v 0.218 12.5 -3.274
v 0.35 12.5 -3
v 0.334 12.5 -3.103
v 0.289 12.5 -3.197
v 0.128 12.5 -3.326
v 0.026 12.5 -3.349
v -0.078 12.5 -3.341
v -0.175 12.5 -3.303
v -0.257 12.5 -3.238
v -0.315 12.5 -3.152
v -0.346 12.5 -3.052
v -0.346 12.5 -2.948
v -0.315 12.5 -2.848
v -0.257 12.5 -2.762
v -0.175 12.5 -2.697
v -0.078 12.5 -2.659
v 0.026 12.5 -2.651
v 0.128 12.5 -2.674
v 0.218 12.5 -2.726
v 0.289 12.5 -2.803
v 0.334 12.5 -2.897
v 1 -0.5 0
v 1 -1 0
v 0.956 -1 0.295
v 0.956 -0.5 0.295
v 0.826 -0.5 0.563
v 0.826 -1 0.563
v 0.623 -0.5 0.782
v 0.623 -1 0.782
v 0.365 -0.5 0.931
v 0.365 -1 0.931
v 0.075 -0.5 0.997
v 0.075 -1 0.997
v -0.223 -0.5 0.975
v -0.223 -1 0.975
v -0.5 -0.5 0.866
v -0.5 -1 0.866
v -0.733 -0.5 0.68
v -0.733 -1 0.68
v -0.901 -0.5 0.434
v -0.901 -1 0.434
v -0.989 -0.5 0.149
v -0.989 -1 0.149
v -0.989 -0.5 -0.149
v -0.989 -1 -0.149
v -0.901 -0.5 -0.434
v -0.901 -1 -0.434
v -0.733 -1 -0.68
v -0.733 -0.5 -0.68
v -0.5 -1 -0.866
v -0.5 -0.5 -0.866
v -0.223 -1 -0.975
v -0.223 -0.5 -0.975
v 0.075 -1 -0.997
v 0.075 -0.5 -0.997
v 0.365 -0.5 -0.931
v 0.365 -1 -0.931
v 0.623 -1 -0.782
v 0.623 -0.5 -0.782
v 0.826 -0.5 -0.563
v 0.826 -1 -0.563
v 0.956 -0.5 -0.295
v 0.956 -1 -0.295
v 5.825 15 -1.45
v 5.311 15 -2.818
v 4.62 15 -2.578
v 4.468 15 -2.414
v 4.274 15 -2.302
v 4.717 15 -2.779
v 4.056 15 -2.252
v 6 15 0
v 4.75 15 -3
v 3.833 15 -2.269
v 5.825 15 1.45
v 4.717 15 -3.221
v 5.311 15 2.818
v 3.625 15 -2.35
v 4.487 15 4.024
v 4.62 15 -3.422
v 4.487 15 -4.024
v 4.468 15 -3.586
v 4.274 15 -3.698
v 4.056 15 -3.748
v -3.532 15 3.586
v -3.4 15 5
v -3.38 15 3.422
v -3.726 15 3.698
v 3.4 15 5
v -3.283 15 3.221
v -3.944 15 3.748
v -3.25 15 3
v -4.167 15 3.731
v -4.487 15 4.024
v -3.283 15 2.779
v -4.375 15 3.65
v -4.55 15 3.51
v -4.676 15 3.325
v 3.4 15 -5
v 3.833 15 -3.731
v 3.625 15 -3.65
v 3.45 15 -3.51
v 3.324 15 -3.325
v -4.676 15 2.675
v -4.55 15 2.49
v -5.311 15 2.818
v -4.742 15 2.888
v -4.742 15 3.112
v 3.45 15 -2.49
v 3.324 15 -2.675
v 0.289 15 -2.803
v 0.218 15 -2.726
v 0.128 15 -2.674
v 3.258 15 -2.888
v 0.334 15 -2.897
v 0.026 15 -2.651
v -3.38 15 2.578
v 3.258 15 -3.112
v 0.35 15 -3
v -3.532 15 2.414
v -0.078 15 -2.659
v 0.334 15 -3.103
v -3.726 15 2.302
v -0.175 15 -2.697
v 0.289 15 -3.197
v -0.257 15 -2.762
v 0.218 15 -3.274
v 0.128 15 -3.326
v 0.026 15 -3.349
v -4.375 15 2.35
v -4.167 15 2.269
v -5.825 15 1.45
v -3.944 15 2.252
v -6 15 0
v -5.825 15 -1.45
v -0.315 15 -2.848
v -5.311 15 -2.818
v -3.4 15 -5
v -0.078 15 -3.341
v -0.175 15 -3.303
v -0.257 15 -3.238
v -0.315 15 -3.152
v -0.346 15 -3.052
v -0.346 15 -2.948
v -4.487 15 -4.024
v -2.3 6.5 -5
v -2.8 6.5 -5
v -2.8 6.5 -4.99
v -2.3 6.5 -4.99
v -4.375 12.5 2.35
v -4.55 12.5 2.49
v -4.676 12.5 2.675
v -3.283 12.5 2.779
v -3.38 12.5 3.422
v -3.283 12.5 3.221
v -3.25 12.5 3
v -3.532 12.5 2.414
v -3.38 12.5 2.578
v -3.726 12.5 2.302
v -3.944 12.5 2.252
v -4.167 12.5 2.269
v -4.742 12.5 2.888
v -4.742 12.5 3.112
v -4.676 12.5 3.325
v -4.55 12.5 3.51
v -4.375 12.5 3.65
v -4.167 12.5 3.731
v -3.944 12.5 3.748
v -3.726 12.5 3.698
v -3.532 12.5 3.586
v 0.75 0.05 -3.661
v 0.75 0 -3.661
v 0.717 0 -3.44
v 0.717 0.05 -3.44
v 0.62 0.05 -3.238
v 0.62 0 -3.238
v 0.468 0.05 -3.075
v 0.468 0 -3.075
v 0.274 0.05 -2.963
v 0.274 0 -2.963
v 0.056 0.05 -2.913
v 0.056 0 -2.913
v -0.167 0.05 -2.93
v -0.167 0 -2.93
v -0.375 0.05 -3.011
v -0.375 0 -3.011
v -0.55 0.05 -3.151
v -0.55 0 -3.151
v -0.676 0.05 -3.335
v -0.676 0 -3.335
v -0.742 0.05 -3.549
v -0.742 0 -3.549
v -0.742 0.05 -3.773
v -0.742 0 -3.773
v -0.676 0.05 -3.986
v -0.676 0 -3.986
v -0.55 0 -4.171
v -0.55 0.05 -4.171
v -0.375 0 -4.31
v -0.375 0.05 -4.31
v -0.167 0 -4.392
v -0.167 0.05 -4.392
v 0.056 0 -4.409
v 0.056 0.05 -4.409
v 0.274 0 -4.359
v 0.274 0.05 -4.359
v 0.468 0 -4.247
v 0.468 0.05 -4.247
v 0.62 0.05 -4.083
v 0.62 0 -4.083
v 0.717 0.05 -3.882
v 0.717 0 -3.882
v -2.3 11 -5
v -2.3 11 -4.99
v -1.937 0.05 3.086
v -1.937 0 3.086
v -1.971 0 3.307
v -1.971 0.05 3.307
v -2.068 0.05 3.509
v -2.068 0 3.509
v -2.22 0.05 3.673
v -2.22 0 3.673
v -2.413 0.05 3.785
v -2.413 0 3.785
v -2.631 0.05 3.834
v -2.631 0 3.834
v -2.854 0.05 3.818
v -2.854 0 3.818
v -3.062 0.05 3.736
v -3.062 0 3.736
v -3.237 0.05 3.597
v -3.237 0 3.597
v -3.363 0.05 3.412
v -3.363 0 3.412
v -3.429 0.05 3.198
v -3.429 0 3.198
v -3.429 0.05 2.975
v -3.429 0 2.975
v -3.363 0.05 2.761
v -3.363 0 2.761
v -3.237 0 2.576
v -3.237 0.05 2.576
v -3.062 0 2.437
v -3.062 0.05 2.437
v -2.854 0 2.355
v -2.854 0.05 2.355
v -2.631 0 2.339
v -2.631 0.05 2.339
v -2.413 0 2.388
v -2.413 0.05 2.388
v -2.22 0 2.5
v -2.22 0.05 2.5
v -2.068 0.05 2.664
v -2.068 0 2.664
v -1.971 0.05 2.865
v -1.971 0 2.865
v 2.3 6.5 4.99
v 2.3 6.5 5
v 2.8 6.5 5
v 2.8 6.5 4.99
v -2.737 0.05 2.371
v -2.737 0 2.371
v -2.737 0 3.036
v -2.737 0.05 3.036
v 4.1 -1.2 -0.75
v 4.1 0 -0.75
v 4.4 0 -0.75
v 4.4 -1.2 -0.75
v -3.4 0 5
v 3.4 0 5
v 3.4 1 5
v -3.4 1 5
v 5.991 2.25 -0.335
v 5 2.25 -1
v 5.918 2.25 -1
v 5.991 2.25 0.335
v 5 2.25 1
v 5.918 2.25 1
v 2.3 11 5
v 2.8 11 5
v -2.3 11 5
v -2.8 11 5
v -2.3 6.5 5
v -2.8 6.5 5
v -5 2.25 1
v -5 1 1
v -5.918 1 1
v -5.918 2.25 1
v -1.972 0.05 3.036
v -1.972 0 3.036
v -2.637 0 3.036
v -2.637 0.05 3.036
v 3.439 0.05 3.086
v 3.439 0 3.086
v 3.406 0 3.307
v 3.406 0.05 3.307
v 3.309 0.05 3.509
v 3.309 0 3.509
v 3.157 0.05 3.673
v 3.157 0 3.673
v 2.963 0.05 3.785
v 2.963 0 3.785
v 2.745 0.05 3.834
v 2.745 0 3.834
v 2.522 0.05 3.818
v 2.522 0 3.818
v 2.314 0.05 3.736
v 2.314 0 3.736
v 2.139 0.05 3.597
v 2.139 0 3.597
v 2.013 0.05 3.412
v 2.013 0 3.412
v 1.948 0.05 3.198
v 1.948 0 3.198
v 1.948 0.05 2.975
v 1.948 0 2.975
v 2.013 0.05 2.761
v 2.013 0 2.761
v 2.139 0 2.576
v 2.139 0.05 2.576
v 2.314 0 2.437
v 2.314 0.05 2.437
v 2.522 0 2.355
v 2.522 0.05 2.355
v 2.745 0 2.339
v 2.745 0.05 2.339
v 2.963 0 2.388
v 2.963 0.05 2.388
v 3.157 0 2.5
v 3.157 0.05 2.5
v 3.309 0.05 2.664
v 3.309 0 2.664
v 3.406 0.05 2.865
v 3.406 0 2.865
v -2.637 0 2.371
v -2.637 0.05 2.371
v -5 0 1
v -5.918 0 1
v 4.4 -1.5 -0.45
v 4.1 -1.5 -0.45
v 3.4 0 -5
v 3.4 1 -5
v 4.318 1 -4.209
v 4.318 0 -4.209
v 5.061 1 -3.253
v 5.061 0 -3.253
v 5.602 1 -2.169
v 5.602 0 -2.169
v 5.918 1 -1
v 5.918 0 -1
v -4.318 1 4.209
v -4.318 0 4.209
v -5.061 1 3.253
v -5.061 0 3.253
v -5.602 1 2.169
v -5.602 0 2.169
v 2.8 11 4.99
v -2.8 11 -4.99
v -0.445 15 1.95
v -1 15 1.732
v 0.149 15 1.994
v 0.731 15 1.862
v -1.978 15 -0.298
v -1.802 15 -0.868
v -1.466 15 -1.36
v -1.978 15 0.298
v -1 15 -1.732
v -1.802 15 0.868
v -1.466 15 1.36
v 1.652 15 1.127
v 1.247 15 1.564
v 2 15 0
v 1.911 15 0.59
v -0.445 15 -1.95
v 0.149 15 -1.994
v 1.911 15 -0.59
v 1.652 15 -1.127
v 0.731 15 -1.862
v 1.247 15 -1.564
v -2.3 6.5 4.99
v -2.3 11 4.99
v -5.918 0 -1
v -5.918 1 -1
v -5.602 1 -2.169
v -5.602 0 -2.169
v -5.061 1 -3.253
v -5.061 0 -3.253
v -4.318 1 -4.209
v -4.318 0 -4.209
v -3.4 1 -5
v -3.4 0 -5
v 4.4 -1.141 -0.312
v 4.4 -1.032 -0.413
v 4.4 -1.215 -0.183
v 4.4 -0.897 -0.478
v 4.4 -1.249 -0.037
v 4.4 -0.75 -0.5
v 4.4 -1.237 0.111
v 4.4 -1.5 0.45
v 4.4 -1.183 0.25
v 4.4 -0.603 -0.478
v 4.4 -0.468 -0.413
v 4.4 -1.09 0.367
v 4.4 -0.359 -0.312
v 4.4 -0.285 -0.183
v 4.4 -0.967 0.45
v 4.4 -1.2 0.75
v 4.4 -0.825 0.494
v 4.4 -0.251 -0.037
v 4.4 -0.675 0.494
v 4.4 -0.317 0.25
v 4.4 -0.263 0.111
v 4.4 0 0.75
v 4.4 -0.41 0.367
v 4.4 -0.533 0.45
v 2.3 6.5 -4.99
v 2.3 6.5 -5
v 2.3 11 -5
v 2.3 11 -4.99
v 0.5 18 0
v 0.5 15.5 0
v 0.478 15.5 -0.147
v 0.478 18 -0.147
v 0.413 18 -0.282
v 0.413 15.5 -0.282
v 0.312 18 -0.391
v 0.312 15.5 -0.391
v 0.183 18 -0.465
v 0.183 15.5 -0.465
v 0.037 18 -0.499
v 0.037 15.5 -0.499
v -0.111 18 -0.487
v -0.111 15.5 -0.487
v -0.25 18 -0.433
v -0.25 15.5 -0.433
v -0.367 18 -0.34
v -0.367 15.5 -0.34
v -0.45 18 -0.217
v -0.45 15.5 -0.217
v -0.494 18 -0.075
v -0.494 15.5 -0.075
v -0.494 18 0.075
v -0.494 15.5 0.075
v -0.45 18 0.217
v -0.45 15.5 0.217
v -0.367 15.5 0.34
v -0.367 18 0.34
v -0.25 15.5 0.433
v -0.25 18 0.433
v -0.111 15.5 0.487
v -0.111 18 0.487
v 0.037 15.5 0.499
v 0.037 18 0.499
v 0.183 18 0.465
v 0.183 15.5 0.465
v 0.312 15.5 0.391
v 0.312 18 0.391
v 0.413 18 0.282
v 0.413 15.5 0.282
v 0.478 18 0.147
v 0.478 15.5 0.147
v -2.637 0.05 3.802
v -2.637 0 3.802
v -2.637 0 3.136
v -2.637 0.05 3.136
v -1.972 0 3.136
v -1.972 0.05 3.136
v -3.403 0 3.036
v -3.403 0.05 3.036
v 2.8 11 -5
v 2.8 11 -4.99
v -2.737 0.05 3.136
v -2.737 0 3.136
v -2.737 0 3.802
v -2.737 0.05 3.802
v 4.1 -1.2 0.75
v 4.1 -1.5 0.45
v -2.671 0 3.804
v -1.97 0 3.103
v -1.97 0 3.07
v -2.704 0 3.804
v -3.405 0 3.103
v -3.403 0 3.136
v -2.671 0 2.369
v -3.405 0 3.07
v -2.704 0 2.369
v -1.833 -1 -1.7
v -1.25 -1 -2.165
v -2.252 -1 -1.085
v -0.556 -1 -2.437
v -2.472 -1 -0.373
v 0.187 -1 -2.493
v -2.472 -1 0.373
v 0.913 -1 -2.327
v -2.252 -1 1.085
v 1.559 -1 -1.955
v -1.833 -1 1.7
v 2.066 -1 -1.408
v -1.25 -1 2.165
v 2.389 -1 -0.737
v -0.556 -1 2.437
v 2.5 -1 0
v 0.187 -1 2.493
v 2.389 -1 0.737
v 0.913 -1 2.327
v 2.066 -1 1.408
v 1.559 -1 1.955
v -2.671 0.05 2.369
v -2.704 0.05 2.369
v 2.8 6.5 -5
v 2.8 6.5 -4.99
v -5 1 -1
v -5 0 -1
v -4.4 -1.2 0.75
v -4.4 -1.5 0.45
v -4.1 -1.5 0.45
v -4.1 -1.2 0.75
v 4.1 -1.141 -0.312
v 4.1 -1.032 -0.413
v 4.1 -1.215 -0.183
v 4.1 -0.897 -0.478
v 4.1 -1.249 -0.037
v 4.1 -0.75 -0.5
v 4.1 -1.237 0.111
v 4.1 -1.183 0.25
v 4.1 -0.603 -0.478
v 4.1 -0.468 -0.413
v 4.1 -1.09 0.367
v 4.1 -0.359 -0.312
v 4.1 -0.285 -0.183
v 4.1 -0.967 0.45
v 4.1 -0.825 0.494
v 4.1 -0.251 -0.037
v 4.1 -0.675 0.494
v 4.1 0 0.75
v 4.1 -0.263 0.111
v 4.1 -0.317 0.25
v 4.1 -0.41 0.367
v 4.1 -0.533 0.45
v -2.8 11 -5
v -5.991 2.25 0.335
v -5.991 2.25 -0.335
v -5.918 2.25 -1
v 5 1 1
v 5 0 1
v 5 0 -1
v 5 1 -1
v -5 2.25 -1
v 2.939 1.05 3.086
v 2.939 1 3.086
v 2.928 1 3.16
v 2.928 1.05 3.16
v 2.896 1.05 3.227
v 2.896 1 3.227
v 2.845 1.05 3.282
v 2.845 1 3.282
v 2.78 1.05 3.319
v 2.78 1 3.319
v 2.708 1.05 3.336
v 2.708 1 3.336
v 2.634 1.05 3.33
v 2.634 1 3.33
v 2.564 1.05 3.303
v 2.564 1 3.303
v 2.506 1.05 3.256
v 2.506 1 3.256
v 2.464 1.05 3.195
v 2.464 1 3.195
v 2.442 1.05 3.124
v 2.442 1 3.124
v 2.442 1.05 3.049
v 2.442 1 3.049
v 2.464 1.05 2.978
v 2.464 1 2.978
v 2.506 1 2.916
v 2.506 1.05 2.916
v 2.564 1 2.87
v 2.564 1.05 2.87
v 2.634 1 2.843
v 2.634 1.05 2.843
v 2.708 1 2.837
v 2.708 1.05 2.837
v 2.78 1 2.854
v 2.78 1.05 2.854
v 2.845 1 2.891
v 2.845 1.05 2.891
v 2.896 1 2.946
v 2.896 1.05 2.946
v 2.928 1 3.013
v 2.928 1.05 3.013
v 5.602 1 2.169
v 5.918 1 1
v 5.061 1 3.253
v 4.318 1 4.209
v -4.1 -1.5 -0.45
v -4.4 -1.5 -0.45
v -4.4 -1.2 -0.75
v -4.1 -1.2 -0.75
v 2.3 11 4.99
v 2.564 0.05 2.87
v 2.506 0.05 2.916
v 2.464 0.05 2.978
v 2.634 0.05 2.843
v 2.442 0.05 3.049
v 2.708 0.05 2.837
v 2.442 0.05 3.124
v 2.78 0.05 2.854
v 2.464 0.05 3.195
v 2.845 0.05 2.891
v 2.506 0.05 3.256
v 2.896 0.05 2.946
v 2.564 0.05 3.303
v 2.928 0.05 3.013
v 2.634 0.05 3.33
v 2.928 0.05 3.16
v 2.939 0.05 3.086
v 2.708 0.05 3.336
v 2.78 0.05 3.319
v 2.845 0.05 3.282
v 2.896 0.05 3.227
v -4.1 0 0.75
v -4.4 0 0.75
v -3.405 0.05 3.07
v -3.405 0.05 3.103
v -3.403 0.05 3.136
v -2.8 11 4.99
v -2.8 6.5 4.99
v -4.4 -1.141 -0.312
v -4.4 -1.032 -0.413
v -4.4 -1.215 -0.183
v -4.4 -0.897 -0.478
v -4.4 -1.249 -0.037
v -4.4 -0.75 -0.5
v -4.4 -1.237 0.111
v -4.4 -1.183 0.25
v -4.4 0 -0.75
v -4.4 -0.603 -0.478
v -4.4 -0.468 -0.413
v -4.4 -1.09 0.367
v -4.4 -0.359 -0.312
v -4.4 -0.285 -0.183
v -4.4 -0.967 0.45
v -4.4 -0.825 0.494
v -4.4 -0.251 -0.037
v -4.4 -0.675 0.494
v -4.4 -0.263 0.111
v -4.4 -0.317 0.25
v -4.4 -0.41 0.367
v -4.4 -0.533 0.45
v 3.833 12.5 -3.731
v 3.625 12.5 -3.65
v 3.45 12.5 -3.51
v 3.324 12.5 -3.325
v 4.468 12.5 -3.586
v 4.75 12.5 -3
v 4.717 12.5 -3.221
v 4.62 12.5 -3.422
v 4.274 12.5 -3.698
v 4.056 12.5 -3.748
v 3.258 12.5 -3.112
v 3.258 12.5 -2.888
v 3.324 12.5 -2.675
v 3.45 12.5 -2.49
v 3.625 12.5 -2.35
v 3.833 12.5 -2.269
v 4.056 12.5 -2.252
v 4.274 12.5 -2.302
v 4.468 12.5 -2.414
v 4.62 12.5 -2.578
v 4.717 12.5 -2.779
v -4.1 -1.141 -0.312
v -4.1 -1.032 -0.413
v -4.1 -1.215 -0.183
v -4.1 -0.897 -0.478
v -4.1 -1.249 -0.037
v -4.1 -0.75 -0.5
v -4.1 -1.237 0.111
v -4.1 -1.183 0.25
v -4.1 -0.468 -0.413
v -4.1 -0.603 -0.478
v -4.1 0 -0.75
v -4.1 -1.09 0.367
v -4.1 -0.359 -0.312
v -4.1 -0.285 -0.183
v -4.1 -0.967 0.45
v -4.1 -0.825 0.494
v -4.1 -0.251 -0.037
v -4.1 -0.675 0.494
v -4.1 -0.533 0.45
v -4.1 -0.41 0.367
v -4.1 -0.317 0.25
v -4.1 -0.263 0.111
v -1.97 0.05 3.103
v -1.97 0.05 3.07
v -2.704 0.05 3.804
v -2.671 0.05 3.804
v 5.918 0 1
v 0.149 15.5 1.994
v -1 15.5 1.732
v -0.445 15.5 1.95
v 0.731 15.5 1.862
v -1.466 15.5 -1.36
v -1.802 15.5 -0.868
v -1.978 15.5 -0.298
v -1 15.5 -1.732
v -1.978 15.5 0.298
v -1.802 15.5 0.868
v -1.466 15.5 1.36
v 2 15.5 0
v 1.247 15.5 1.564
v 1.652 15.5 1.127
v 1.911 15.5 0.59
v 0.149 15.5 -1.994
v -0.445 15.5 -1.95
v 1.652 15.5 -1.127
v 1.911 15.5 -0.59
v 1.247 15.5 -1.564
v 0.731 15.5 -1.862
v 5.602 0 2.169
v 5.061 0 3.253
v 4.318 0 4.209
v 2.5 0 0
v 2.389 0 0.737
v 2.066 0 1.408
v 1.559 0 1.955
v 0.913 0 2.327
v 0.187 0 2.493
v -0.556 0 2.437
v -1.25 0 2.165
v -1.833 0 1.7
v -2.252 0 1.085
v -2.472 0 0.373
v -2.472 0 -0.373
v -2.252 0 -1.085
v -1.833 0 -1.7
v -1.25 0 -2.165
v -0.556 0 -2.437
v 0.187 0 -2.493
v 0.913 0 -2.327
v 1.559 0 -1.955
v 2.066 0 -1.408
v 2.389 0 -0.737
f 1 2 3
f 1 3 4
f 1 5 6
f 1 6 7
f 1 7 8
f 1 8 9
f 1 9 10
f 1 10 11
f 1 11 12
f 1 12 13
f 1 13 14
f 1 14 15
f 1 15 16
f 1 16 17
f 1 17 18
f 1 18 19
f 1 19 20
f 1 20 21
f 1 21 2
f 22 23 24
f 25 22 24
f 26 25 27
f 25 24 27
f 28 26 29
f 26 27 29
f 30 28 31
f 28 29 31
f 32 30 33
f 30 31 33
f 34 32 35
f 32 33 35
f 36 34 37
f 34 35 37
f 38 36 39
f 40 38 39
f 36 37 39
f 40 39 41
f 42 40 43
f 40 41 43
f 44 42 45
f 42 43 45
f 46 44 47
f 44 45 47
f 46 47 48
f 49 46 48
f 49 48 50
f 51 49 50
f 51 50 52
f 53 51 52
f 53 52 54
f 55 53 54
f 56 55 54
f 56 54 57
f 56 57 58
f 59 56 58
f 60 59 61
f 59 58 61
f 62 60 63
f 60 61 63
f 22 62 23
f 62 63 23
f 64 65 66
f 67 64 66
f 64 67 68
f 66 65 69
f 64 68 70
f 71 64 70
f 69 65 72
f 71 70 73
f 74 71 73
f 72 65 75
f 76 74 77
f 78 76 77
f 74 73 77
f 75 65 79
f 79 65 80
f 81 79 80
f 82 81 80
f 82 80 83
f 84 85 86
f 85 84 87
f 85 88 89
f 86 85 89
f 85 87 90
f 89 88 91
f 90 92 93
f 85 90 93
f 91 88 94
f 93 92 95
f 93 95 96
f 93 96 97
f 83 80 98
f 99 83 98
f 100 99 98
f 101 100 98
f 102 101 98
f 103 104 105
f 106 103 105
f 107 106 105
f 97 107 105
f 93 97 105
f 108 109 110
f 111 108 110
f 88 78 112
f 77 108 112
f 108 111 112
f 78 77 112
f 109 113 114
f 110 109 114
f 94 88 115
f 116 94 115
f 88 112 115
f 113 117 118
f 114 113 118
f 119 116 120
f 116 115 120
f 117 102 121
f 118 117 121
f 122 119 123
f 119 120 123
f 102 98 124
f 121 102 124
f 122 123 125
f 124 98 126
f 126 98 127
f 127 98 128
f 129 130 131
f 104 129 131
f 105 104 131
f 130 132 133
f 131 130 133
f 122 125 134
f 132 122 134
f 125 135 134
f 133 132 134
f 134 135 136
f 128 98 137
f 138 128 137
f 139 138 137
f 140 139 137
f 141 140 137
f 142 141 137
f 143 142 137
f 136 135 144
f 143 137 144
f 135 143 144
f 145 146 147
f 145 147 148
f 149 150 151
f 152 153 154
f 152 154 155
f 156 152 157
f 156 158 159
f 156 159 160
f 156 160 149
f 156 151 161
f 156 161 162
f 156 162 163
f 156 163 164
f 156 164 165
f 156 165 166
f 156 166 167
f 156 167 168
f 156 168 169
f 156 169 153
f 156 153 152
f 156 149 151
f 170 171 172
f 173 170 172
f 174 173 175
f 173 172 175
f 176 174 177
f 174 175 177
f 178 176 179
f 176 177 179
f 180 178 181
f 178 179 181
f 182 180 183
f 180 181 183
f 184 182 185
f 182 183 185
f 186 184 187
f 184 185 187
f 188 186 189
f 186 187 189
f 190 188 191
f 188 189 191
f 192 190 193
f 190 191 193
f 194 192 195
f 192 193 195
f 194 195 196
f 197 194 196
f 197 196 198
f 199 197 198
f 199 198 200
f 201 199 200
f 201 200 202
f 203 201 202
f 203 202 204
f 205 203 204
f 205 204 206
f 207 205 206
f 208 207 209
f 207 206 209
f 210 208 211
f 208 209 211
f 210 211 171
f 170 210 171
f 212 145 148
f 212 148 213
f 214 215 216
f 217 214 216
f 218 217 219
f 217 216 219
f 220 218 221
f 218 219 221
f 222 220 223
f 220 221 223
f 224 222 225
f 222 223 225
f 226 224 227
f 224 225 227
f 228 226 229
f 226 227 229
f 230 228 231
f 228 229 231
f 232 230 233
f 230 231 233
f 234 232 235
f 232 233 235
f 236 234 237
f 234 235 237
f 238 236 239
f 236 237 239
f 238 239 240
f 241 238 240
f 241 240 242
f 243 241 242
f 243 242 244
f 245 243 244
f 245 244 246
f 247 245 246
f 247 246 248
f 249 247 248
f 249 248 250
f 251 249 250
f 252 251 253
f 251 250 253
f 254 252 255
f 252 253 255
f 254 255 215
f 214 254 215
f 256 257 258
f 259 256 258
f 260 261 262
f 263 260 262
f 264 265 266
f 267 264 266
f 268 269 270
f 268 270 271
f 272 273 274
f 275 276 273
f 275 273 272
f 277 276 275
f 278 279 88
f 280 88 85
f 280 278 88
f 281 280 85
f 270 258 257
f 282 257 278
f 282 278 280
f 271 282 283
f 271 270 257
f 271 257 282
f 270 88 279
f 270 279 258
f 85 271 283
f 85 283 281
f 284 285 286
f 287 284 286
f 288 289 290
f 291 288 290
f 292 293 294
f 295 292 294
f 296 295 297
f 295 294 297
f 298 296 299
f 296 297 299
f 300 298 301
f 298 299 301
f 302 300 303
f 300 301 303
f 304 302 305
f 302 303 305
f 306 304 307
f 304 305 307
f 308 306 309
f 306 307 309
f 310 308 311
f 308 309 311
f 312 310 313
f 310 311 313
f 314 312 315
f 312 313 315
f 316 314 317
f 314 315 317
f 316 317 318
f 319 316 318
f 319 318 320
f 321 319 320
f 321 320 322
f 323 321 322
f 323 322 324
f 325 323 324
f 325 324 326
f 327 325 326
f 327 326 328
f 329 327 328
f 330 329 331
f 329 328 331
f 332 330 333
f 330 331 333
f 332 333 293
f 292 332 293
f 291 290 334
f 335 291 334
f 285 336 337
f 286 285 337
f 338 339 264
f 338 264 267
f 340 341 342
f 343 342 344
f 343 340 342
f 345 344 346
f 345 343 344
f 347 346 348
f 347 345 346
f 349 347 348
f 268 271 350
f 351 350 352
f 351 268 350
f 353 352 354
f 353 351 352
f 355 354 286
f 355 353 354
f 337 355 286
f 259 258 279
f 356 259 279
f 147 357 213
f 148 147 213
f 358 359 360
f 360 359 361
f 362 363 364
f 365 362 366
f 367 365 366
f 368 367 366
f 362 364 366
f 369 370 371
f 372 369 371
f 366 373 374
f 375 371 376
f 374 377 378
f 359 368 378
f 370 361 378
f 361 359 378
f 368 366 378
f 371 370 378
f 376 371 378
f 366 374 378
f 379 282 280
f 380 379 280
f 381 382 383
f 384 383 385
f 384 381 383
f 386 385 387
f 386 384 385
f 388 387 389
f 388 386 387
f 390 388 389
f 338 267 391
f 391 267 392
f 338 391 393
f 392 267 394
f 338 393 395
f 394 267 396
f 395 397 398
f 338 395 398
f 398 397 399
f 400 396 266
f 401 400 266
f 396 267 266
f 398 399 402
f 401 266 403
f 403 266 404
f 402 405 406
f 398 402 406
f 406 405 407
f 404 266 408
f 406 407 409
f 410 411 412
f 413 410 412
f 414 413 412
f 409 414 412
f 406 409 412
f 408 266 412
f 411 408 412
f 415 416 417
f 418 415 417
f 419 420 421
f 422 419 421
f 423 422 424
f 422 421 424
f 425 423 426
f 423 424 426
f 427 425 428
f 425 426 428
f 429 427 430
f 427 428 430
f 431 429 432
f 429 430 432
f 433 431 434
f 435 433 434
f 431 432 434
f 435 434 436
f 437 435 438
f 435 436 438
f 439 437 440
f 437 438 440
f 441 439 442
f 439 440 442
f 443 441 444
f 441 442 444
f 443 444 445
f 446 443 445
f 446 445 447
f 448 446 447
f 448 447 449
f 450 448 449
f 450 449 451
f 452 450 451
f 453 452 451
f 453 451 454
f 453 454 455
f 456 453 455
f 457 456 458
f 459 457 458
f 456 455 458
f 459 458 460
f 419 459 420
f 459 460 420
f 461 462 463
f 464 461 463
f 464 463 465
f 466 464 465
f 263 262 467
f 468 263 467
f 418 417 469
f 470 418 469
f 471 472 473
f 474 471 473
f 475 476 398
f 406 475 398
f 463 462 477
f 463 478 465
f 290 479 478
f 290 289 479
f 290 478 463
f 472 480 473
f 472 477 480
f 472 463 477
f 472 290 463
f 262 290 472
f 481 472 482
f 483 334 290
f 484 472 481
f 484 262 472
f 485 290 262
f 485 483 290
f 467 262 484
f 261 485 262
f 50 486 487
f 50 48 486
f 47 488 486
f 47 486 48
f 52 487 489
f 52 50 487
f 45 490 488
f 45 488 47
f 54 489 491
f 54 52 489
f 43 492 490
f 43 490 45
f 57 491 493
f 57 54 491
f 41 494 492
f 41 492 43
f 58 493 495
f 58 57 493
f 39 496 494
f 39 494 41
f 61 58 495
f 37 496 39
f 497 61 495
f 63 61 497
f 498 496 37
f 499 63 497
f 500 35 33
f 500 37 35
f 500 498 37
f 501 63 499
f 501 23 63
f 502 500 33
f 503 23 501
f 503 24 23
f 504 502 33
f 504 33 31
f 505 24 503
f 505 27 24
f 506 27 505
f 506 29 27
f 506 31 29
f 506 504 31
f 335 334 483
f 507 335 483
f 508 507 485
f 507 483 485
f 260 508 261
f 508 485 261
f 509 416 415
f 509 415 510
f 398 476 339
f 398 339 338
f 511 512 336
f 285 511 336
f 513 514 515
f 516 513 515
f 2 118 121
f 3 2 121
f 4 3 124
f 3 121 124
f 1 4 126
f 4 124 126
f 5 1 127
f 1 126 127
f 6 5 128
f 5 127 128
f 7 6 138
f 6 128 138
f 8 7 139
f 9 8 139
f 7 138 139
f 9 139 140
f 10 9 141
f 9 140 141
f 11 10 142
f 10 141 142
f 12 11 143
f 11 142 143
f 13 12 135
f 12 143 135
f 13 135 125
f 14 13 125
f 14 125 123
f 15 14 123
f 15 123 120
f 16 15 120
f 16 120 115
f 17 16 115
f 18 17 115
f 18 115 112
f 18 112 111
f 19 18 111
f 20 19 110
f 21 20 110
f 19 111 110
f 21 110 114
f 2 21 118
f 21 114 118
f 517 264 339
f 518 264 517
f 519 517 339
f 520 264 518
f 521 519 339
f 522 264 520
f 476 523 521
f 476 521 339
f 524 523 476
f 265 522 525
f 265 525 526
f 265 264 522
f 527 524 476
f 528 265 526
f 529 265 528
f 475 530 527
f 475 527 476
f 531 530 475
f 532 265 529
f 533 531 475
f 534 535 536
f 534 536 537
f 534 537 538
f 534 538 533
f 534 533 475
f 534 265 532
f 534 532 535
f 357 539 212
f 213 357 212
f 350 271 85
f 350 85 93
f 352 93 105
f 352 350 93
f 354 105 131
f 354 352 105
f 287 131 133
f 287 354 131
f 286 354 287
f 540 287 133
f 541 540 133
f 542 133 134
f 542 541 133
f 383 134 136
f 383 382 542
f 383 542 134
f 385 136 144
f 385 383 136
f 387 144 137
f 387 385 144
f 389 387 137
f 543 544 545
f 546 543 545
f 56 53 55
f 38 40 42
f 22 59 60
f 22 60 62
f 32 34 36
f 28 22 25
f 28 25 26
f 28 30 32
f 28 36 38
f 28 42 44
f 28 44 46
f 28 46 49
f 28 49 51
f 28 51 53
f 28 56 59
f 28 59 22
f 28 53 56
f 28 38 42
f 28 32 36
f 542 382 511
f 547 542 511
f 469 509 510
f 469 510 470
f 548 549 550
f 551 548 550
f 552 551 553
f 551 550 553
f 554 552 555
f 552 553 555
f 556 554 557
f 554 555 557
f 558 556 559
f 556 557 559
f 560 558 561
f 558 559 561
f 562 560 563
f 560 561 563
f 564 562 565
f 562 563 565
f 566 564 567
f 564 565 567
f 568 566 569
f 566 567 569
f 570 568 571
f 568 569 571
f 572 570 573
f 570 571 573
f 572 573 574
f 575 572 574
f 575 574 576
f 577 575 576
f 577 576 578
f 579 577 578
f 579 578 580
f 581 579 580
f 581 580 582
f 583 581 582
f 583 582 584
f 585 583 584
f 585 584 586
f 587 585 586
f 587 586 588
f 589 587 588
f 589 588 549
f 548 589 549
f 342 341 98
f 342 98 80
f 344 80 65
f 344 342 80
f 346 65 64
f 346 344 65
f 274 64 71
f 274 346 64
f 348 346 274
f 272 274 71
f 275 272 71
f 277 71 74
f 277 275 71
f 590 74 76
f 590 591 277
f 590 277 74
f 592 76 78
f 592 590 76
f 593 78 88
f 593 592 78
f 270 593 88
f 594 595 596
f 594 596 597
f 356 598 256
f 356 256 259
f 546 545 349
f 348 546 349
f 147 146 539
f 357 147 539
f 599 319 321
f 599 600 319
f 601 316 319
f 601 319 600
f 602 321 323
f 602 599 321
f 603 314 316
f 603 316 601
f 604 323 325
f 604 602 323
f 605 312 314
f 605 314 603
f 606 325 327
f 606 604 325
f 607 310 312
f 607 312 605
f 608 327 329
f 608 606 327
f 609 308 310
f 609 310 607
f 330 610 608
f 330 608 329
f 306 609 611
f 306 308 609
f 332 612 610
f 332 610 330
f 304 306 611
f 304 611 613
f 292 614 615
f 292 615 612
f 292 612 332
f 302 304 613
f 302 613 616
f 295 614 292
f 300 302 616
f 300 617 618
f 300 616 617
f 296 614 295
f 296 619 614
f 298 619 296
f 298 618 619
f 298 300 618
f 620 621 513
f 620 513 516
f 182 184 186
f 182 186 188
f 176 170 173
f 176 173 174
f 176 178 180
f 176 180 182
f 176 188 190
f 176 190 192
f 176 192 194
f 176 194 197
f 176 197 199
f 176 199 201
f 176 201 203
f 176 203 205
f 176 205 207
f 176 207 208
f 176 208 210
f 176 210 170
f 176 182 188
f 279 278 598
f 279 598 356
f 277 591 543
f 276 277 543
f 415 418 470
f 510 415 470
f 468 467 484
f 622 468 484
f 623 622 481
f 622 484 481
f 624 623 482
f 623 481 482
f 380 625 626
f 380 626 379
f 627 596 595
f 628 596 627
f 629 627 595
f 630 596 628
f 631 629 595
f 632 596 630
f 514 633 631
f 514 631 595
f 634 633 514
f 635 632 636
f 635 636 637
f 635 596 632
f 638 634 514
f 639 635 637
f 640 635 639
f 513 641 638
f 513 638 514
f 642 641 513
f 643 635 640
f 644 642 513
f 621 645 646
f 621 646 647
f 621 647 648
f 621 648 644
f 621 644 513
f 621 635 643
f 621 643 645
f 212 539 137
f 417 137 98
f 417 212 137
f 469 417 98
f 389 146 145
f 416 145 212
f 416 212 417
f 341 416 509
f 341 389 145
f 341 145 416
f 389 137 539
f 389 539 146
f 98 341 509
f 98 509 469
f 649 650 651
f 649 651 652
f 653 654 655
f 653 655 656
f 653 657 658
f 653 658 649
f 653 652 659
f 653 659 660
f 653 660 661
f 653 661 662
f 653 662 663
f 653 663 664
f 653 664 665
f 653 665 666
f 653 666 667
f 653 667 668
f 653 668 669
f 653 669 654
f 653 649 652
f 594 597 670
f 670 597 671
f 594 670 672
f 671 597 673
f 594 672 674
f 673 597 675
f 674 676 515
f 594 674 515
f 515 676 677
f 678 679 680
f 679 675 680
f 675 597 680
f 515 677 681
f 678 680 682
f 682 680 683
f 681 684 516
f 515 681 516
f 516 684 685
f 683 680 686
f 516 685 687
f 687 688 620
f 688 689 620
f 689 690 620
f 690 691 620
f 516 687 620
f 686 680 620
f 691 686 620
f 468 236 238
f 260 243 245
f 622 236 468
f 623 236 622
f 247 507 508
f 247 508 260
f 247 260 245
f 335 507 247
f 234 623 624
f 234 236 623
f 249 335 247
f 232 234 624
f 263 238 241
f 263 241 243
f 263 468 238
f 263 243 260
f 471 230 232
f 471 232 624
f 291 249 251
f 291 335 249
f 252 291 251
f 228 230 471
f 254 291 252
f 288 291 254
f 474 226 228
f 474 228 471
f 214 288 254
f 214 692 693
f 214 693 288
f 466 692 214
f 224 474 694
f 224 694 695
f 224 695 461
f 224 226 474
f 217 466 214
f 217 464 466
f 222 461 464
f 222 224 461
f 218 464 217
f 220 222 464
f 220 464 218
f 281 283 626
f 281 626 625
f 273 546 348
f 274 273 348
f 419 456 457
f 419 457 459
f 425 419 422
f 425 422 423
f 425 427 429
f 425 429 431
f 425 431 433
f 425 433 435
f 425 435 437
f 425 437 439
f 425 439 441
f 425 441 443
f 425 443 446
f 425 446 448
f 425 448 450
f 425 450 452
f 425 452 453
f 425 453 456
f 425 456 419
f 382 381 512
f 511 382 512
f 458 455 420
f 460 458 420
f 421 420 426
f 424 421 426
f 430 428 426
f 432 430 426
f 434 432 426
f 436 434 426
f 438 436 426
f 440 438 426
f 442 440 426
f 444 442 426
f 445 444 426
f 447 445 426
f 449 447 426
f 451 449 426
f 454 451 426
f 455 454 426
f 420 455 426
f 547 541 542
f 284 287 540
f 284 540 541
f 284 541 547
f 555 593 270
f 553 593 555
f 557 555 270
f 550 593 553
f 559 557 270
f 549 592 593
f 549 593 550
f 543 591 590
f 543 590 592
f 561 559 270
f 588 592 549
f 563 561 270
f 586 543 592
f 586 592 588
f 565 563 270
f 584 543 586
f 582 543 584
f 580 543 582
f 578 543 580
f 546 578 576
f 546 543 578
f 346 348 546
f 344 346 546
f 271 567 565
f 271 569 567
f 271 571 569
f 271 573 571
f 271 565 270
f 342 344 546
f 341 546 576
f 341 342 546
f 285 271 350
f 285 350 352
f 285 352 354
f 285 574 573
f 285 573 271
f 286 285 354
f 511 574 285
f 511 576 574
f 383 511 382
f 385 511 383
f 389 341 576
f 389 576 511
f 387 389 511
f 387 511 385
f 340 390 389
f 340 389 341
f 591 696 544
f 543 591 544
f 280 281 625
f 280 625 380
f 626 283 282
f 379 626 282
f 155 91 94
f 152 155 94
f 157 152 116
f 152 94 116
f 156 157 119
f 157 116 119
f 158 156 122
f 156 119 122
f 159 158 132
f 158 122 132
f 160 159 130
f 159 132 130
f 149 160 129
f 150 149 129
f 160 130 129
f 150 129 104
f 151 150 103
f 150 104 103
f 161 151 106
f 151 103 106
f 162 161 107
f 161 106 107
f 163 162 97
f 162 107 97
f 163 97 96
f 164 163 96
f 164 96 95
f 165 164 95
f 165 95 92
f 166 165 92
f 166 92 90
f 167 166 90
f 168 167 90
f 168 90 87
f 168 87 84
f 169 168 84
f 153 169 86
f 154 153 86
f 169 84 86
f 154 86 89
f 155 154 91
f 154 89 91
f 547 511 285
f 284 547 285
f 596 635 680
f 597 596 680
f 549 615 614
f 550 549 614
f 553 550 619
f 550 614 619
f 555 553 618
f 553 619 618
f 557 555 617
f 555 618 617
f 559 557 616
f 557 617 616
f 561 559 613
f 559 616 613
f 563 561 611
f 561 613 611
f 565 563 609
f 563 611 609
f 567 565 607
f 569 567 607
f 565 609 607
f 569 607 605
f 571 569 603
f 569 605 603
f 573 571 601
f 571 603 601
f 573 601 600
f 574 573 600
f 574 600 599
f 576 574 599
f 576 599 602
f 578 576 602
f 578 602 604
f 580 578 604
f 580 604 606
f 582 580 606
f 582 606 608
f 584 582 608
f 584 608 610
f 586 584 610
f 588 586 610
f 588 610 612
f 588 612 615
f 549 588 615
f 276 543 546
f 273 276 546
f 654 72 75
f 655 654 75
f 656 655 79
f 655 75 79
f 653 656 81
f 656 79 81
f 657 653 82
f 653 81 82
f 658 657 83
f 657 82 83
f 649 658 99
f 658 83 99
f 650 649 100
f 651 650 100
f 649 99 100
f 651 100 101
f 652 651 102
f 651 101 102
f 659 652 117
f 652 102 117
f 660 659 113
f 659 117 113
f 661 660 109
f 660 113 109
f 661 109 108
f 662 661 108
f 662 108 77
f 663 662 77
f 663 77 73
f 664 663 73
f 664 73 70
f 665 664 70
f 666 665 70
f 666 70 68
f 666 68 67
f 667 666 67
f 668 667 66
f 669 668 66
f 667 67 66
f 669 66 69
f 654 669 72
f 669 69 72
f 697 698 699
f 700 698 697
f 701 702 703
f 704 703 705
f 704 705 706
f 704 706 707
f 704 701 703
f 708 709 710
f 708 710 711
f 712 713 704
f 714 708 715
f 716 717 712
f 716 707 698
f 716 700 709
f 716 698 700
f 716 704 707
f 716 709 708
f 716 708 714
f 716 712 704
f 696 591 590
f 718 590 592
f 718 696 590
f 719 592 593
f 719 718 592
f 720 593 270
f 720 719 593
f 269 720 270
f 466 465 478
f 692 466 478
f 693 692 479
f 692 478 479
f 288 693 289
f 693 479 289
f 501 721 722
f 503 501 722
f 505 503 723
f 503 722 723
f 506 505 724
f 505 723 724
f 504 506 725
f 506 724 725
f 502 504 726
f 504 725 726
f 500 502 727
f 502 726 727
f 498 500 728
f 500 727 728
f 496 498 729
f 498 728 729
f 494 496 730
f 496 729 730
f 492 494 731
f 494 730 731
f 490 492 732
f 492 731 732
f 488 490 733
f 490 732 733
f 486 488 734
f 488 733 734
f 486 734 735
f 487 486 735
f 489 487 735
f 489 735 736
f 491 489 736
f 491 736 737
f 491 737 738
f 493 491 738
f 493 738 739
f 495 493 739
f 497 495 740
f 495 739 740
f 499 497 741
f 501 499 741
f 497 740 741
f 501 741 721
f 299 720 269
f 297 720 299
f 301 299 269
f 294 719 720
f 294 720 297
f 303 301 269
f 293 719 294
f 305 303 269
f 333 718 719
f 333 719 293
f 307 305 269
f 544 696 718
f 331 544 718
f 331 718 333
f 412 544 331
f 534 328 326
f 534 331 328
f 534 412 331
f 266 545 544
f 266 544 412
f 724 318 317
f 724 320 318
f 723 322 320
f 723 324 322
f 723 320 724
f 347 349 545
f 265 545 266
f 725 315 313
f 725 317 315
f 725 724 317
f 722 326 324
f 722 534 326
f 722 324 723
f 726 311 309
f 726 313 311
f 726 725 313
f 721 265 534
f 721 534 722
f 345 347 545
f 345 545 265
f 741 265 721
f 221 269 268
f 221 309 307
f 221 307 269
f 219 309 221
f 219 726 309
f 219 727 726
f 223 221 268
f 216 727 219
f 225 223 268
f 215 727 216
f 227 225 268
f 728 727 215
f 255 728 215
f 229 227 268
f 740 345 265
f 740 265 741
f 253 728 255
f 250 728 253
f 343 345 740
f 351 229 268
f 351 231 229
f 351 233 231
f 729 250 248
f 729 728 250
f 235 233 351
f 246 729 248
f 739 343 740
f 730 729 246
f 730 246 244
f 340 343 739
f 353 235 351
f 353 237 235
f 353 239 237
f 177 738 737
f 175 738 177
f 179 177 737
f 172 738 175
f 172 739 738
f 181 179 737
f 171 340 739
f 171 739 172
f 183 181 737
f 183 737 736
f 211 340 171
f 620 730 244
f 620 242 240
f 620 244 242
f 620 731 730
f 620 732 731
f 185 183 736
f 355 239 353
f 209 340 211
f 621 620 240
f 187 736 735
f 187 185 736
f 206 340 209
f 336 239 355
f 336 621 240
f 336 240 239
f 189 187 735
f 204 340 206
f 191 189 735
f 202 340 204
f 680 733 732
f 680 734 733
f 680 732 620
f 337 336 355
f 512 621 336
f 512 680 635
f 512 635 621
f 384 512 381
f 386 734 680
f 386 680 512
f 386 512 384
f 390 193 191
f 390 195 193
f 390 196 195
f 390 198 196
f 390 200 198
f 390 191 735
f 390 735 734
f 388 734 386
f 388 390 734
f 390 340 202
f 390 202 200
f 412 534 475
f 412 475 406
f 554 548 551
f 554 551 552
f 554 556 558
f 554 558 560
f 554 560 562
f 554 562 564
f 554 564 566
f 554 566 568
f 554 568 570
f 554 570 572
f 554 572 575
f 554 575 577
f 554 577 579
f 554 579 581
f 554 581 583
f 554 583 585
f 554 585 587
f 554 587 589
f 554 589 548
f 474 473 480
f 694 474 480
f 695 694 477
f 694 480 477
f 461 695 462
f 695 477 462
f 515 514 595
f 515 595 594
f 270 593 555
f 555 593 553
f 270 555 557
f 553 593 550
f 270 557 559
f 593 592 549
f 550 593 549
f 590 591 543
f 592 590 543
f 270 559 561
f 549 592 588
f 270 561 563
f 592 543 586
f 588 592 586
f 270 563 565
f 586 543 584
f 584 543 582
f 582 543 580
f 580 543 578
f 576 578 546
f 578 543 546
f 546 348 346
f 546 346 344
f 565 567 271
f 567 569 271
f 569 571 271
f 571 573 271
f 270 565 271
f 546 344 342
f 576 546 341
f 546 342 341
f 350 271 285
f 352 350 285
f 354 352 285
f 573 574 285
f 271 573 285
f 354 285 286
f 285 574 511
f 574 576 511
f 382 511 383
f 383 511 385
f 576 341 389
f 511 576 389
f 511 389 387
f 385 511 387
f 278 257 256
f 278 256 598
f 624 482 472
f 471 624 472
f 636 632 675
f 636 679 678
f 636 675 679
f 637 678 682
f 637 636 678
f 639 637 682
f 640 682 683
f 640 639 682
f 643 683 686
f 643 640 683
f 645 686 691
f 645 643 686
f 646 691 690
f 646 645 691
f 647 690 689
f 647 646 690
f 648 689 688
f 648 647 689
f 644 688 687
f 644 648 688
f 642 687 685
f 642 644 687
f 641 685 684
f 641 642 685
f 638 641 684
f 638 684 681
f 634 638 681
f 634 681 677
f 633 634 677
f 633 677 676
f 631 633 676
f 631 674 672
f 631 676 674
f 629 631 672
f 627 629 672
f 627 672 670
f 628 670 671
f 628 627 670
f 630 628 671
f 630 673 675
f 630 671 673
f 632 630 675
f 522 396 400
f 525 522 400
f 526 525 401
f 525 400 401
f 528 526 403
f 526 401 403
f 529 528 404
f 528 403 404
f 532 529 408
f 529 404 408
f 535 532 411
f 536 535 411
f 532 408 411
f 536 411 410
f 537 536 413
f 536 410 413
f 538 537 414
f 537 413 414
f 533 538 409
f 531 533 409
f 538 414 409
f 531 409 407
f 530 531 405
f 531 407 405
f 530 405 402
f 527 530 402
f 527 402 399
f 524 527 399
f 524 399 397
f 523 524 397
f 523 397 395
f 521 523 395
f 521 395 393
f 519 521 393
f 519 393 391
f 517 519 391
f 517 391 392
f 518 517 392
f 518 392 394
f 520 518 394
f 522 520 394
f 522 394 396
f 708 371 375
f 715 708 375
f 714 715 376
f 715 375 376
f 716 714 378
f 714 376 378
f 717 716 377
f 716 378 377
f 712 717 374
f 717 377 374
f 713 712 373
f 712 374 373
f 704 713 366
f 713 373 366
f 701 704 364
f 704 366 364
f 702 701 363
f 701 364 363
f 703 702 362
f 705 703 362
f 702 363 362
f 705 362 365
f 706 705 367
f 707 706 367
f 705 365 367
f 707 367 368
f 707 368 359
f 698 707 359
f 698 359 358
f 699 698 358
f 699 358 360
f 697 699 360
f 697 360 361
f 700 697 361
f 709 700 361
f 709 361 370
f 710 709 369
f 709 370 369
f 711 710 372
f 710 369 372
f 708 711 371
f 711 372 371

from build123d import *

# Parameters (mm, degrees)
SALIENTE_EXTRUIR1_DEPTH = 1
SALIENTE_EXTRUIR2_DEPTH = 14
CROQUIS3_W              = 0.5
CROQUIS3_H              = 4.5
CORTAR_EXTRUIR1_DEPTH   = 0.01
CORTAR_EXTRUIR2_DEPTH   = 2.25
CROQUIS5_R              = 2.5
SALIENTE_EXTRUIR3_DEPTH = 1
CROQUIS6_R              = 1
CORTAR_EXTRUIR3_DEPTH   = 0.5
CROQUIS7_W              = 0.3
CROQUIS7_H              = 1.5
SALIENTE_EXTRUIR4_DEPTH = 1.5
CROQUIS8_R              = 0.5
CORTAR_EXTRUIR4_DEPTH   = 1
CHAFL_N1_SIZE           = 0.3
CROQUIS9_R              = 0.75
CORTAR_EXTRUIR5_DEPTH   = 0.05
CROQUIS10_R             = 0.25
CORTAR_EXTRUIR6_DEPTH   = 1
CROQUIS11_R             = 0.75
CORTAR_EXTRUIR7_DEPTH   = 0.05
CROQUIS12_R             = 2
SALIENTE_EXTRUIR5_DEPTH = 0.5
CROQUIS13_R             = 0.5
SALIENTE_EXTRUIR6_DEPTH = 2.5
CROQUIS14_R             = 0.75
CROQUIS14_R_2           = 0.35
CORTAR_EXTRUIR8_DEPTH   = 2.5


with BuildPart() as part:
    # Croquis1 → Saliente-Extruir1 (new body)
    with BuildSketch(Plane(origin=(0, 0, 0), x_dir=(1, 0, 0), z_dir=(0, 1, 0))):
        with BuildLine():
            Line((-3.4, 5), (3.4, 5))
            ThreePointArc((3.4, 5), (6, 0), (3.4, -5))
            Line((3.4, -5), (-3.4, -5))
            ThreePointArc((-3.4, -5), (-6, 0), (-3.4, 5))
        make_face()
    extrude(amount=SALIENTE_EXTRUIR1_DEPTH)


with BuildPart() as body_2:
    # Croquis2 → Saliente-Extruir2 (new body)
    with BuildSketch(Plane(origin=(0, 1, 0), x_dir=(1, 0, 0), z_dir=(0, 1, 0))):
        with BuildLine():
            Line((-3.4, 5), (3.4, 5))
            ThreePointArc((3.4, 5), (6, 0), (3.4, -5))
            Line((3.4, -5), (-3.4, -5))
            ThreePointArc((-3.4, -5), (-6, 0), (-3.4, 5))
        make_face()
    extrude(amount=SALIENTE_EXTRUIR2_DEPTH)

    # Croquis3 → Cortar-Extruir1 (cut)
    with BuildSketch(Plane.XY.offset(5)):
        with Locations((-2.55, 8.75)):
            Rectangle(CROQUIS3_W, CROQUIS3_H)
        with Locations((2.55, 8.75)):
            Rectangle(CROQUIS3_W, CROQUIS3_H)
    cortar_extruir1 = extrude(amount=-CORTAR_EXTRUIR1_DEPTH, mode=Mode.SUBTRACT)

    # Simetría2: Cortar-Extruir1 across plane
    add(cortar_extruir1.mirror(Plane.XY), mode=Mode.SUBTRACT)


with BuildPart() as cortar_extruir2_tool:
    # Croquis4 → Cortar-Extruir2 (new body)
    with BuildSketch(Plane.XZ):
        with BuildLine():
            Line((5, 1), (5, -1))
            Line((5, -1), (5.917579912, -1))
            ThreePointArc((5.917579912, -1), (6, 0), (5.917579912, 1))
            Line((5.917579912, 1), (5, 1))
        make_face()
        with BuildLine():
            Line((-5, 1), (-5.917579912, 1))
            ThreePointArc((-5.917579912, 1), (-6, 0), (-5.917579912, -1))
            Line((-5.917579912, -1), (-5, -1))
            Line((-5, -1), (-5, 1))
        make_face()
    extrude(amount=-CORTAR_EXTRUIR2_DEPTH)


with BuildPart() as part_1:
    add(part.part)

    # Cortar-Extruir2: cut by cortar_extruir2_tool
    add(cortar_extruir2_tool.part, mode=Mode.SUBTRACT)

    # Croquis5 → Saliente-Extruir3 (add)
    with BuildSketch(Plane.XZ):
        Circle(CROQUIS5_R)
    extrude(amount=SALIENTE_EXTRUIR3_DEPTH)

    # Croquis6 → Cortar-Extruir3 (cut)
    with BuildSketch(Plane.XZ.offset(1)):
        Circle(CROQUIS6_R)
    extrude(amount=-CORTAR_EXTRUIR3_DEPTH, mode=Mode.SUBTRACT)

    # Croquis7 → Saliente-Extruir4 (add)
    with BuildSketch(Plane.XZ):
        with Locations((4.25, 0)):
            Rectangle(CROQUIS7_W, CROQUIS7_H)
        with Locations((-4.25, 0)):
            Rectangle(CROQUIS7_W, CROQUIS7_H)
    extrude(amount=SALIENTE_EXTRUIR4_DEPTH)

    # Croquis8 → Cortar-Extruir4 (cut)
    with BuildSketch(Plane(origin=(4.4, 0, 0), x_dir=(0, 0, -1), z_dir=(1, 0, 0))):
        with Locations((0, -0.75)):
            Circle(CROQUIS8_R)
    cortar_extruir4 = extrude(amount=-CORTAR_EXTRUIR4_DEPTH, mode=Mode.SUBTRACT)

    # Simetría3: Cortar-Extruir4 across plane
    add(cortar_extruir4.mirror(Plane(origin=(0, 0, 0), x_dir=(0, 0, 1), z_dir=(1, 0, 0))), mode=Mode.SUBTRACT)

    # Chaflán1
    chafl_n1_edges = [part_1.edges().sort_by_distance(p)[0] for p in [
        (4.25, -1.5, 0.75),
        (4.25, -1.5, -0.75),
        (-4.25, -1.5, 0.75),
        (-4.25, -1.5, -0.75),
    ]]
    chamfer(chafl_n1_edges, length=CHAFL_N1_SIZE)

    # Croquis9 → Cortar-Extruir5 (cut)
    with BuildSketch(Plane.XZ):
        with Locations((2.689144547, 3.086404537)):
            Circle(CROQUIS9_R)
        with Locations((0, -3.660903599)):
            Circle(CROQUIS9_R)
    extrude(amount=-CORTAR_EXTRUIR5_DEPTH, mode=Mode.SUBTRACT)


with BuildPart() as body_2_1:
    add(body_2.part)

    # Cortar-Extruir2: cut by cortar_extruir2_tool
    add(cortar_extruir2_tool.part, mode=Mode.SUBTRACT)


with BuildPart() as cortar_extruir6_tool:
    # Croquis10 → Cortar-Extruir6 (new body)
    with BuildSketch(Plane.XZ.offset(-0.05)):
        with Locations((2.689144547, 3.086404537)):
            Circle(CROQUIS10_R)
    extrude(amount=-CORTAR_EXTRUIR6_DEPTH)


with BuildPart() as part_2:
    add(part_1.part)

    # Cortar-Extruir6: cut by cortar_extruir6_tool
    add(cortar_extruir6_tool.part, mode=Mode.SUBTRACT)

    # Croquis11 → Cortar-Extruir7 (cut)
    with BuildSketch(Plane.XZ):
        with Locations((-2.687365336, 3.086404537)):
            Circle(CROQUIS11_R)
        with BuildLine():
            Line((-2.637365336, 3.794778488), (-2.637365336, 3.136404537))
            Line((-2.637365336, 3.136404537), (-1.97177306, 3.136404537))
            ThreePointArc((-1.97177306, 3.136404537), (-1.970028382, 3.086404537), (-1.97177306, 3.036404537))
            Line((-1.97177306, 3.036404537), (-2.637365336, 3.036404537))
            Line((-2.637365336, 3.036404537), (-2.637365336, 2.378030586))
            Line((-2.637365336, 2.378030586), (-2.637365336, 2.370812261))
            ThreePointArc((-2.637365336, 2.370812261), (-2.687365336, 2.369067583), (-2.737365336, 2.370812261))
            Line((-2.737365336, 2.370812261), (-2.737365336, 2.378030586))
            Line((-2.737365336, 2.378030586), (-2.737365336, 3.036404537))
            Line((-2.737365336, 3.036404537), (-3.402957612, 3.036404537))
            ThreePointArc((-3.402957612, 3.036404537), (-3.40470229, 3.086404537), (-3.402957612, 3.136404537))
            Line((-3.402957612, 3.136404537), (-2.737365336, 3.136404537))
            Line((-2.737365336, 3.136404537), (-2.737365336, 3.794778488))
            Line((-2.737365336, 3.794778488), (-2.737365336, 3.801996813))
            ThreePointArc((-2.737365336, 3.801996813), (-2.687365336, 3.803741491), (-2.637365336, 3.801996813))
            Line((-2.637365336, 3.801996813), (-2.637365336, 3.794778488))
        make_face(mode=Mode.SUBTRACT)
    extrude(amount=-CORTAR_EXTRUIR7_DEPTH, mode=Mode.SUBTRACT)


with BuildPart() as body_2_2:
    add(body_2_1.part)

    # Cortar-Extruir6: cut by cortar_extruir6_tool
    add(cortar_extruir6_tool.part, mode=Mode.SUBTRACT)

    # Croquis14 → Cortar-Extruir8 (cut)
    with BuildSketch(Plane(origin=(0, 15, 0), x_dir=(1, 0, 0), z_dir=(0, 1, 0))):
        with Locations((-4, -3)):
            Circle(CROQUIS14_R)
        with Locations((4, 3)):
            Circle(CROQUIS14_R)
        with Locations((0, 3)):
            Circle(CROQUIS14_R_2)
    extrude(amount=-CORTAR_EXTRUIR8_DEPTH, mode=Mode.SUBTRACT)


with BuildPart() as body_3:
    # Croquis12 → Saliente-Extruir5 (new body)
    with BuildSketch(Plane(origin=(0, 15, 0), x_dir=(1, 0, 0), z_dir=(0, 1, 0))):
        Circle(CROQUIS12_R)
    extrude(amount=SALIENTE_EXTRUIR5_DEPTH)


with BuildPart() as body_4:
    # Croquis13 → Saliente-Extruir6 (new body)
    with BuildSketch(Plane(origin=(0, 15.5, 0), x_dir=(1, 0, 0), z_dir=(0, 1, 0))):
        Circle(CROQUIS13_R)
    extrude(amount=SALIENTE_EXTRUIR6_DEPTH)


solid = Compound([part_2.part, body_2_2.part, body_3.part, body_4.part])
